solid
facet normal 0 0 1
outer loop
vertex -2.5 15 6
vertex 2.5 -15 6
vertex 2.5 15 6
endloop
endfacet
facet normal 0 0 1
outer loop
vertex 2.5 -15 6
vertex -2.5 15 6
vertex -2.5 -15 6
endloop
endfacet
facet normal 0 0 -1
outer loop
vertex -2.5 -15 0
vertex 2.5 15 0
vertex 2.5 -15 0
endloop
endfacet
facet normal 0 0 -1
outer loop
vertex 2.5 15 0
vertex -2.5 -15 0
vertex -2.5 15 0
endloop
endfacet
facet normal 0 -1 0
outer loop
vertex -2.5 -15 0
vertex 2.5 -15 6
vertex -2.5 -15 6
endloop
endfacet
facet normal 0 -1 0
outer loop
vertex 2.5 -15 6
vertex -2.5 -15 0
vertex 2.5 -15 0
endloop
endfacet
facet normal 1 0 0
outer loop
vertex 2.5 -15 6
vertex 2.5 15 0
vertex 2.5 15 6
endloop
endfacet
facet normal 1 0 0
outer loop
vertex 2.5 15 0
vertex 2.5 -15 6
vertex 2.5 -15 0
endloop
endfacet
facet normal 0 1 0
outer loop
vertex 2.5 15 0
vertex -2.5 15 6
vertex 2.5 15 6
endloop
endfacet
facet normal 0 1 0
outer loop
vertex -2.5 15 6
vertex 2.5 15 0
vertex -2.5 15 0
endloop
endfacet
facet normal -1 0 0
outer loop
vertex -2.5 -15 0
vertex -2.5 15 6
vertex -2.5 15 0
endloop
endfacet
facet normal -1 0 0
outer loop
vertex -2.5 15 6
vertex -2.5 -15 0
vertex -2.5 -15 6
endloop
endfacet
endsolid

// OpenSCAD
// brick 1x6

// external vars #########################

ext_scale = 1.0;
ext_fn = 12;

// part ##################################

module brick_1x6(m_scale=ext_scale,m_fn=ext_fn) {
    scale([m_scale,m_scale,m_scale])
    translate([-2.5,-15,0])
    cube([5,30,6],center=false);
}

brick_1x6();
